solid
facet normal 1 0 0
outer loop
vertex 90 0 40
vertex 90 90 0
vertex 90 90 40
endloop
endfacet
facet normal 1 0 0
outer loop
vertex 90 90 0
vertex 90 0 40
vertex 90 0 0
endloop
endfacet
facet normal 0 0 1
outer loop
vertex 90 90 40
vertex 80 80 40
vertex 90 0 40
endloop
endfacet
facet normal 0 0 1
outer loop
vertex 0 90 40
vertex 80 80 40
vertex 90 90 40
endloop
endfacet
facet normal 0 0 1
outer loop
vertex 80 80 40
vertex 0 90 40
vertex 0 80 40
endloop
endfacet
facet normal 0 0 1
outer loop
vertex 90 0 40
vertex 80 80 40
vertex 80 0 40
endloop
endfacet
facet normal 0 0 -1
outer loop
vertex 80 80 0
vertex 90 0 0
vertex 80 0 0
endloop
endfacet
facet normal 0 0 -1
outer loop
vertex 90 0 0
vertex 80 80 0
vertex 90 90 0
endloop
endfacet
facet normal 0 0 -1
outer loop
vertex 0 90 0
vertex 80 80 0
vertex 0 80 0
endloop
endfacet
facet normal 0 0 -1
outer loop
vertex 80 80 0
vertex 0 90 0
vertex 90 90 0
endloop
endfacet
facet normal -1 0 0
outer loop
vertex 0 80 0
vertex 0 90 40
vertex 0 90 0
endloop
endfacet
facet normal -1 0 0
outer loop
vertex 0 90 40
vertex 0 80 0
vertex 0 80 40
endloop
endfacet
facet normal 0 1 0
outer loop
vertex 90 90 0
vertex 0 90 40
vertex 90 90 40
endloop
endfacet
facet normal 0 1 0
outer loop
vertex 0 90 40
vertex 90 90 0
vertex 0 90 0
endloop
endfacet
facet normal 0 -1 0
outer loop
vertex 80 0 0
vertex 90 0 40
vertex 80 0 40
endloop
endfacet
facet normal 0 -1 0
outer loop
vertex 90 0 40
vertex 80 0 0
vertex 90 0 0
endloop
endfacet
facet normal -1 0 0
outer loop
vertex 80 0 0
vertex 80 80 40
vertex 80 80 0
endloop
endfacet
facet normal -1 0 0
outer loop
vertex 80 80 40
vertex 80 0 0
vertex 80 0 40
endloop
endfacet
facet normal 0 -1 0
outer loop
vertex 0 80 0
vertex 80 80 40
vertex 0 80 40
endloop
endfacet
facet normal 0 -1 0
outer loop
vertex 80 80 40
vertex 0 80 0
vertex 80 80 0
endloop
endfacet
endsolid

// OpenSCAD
// DIY Magnetic Stirrer Housing - built upside down on the print bed.
// Top plate (z=0 to 2) with M4 screw holes, four walls rising to z=40.
// Outer size: 90x90mm. Fan size: 80x80mm.

$fn = 64;

// Dimensions
outer_w = 90;
outer_h = 90;
top_t   = 2;
wall_t  = 2.5;
box_h   = 40; // Total height from bed to open top
fan_w   = 80; // Inner clear width for the fan

// Screw holes
screw_d = 4.5;
screw_p = 71.5; // Pattern size (distance between centers)

// Cable notch
notch_w = 12;
notch_h = 8; // Depth from open edge (z=40) down to z=32

// Derived positions
// Hole positions: 71.5mm square pattern centered on origin.
// Distance from center to hole = 71.5 / 2 = 35.75.
hole_offset = screw_p / 2;

// Generate the four screw hole coordinates using a list comprehension.
// Order: (-,-), (+,-), (+,+), (-,+)
screw_coords = [for (i = [0 : 3]) let(
    row = (i < 2) ? -1 : 1,
    col = (i < 1 || i == 2) ? -1 : 1
) [col * hole_offset, row * hole_offset]];

module build_housing() {
    difference() {
        // 1. The solid outer block
        translate([0, 0, 0]) 
            cube([outer_w, outer_h, box_h]);

        // 2. Cut the internal void (the fan space)
        // The void is centered, has size fan_w x fan_w, and goes from z=0 to z=box_h.
        // We extend the cut slightly past the top and bottom to ensure clean faces.
        translate([0, 0, -1]) 
            cube([fan_w, fan_w, box_h + 2]);

        // 3. Cut the four screw holes through the top plate
        // Holes are at z=0 to z=top_t.
        for (pos = screw_coords) {
            translate(pos)
                cylinder(h = top_t + 1, d = screw_d); // +1 to cut slightly past top
        }

        // 4. Cut the cable notch in one wall
        // Placed in the wall at X = -outer_w/2 + wall_t/2 (Left wall).
        // Notch width: notch_w.
        // Notch depth: notch_h (from open edge z=box_h down to z=box_h-notch_h).
        // Position: Centered along the wall (Y=0).
        
        wall_x_pos = -outer_w / 2 + wall_t / 2;
        
        translate([wall_x_pos, 0, box_h - notch_h])
            cube([notch_w, wall_t, notch_h]);
    }
}

build_housing();
